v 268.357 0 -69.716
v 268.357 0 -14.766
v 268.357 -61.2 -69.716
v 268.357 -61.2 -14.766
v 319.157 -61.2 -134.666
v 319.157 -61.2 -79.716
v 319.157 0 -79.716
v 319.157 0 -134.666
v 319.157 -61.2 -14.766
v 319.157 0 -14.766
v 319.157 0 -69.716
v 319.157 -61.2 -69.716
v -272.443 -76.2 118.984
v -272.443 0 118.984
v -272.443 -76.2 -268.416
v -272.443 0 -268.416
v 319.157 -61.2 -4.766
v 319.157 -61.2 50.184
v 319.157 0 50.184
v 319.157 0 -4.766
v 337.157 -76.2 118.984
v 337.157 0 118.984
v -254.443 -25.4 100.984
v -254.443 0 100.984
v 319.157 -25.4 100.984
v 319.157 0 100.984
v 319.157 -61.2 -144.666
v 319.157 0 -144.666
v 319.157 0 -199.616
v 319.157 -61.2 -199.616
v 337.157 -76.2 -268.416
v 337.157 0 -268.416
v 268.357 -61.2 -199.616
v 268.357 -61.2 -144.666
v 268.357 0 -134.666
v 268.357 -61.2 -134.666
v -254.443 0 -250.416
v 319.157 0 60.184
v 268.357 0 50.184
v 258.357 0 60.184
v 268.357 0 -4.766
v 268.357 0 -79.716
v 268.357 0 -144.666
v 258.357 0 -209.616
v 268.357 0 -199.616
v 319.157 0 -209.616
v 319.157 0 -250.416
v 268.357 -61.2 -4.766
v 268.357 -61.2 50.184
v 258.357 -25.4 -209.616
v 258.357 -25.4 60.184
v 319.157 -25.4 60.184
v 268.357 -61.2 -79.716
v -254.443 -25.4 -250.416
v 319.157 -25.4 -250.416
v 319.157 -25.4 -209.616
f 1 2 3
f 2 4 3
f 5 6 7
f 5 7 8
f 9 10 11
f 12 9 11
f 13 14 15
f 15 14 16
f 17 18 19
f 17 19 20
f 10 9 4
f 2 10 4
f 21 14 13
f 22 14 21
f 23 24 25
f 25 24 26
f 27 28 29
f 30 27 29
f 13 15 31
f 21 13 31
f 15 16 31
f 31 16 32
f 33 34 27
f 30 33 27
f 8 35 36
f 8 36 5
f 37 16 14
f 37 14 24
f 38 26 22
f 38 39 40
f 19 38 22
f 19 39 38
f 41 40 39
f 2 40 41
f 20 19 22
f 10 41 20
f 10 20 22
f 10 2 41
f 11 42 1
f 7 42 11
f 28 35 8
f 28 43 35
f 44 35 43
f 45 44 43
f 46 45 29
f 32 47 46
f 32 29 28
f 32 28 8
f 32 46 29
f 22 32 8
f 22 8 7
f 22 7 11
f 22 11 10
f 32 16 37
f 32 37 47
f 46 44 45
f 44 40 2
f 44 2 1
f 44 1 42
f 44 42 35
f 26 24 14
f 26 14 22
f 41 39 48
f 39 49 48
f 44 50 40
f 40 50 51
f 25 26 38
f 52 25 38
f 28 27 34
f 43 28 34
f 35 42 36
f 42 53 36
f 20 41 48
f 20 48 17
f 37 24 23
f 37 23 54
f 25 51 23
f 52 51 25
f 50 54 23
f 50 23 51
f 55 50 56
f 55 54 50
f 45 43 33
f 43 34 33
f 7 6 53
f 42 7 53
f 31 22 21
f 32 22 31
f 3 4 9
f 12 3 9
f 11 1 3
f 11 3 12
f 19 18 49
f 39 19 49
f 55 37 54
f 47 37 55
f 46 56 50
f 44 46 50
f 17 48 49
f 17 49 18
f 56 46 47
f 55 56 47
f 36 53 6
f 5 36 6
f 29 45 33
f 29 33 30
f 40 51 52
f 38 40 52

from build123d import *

# Parameters (mm, degrees)
SKETCH1_W           = 609.6
SKETCH1_H           = 387.4
BOSS_EXTRUDE1_DEPTH = 76.2
SKETCH2_W           = 573.6
SKETCH2_H           = 351.4
CUT_EXTRUDE1_DEPTH  = 25.4
SKETCH3_W           = 50.8
SKETCH3_H           = 54.95
CUT_EXTRUDE2_DEPTH  = 35.8
BOSS_EXTRUDE2_DEPTH = 25.4


with BuildPart() as part:
    # Sketch1 → Boss-Extrude1 (new body)
    with BuildSketch(Plane(origin=(0, 0, 0), x_dir=(1, 0, 0), z_dir=(0, 1, 0))):
        with Locations((32.357180973, 74.716472916)):
            Rectangle(SKETCH1_W, SKETCH1_H)
    extrude(amount=-BOSS_EXTRUDE1_DEPTH)

    # Sketch2 → Cut-Extrude1 (cut)
    with BuildSketch(Plane(origin=(0, 0, 0), x_dir=(1, 0, 0), z_dir=(0, 1, 0))):
        with Locations((32.357180973, 74.716472916)):
            Rectangle(SKETCH2_W, SKETCH2_H)
    extrude(amount=-CUT_EXTRUDE1_DEPTH, mode=Mode.SUBTRACT)

    # Sketch3 → Cut-Extrude2 (cut)
    with BuildSketch(Plane(origin=(0, -25.4, 0), x_dir=(1, 0, 0), z_dir=(0, 1, 0))):
        with Locations((293.757180973, 172.141472916)):
            Rectangle(SKETCH3_W, SKETCH3_H)
        with Locations((293.757180973, 107.191472916)):
            Rectangle(SKETCH3_W, SKETCH3_H)
        with Locations((293.757180973, 42.241472916)):
            Rectangle(SKETCH3_W, SKETCH3_H)
        with Locations((293.757180973, -22.708527084)):
            Rectangle(SKETCH3_W, SKETCH3_H)
    extrude(amount=-CUT_EXTRUDE2_DEPTH, mode=Mode.SUBTRACT)

    # Sketch7 → Boss-Extrude2 (add)
    with BuildSketch(Plane(origin=(0, -25.4, 0), x_dir=(1, 0, 0), z_dir=(0, 1, 0))):
        Polygon((319.157180973, 209.616472916), (258.357180973, 209.616472916), (258.357180973, -60.183527084), (319.157180973, -60.183527084), (319.157180973, -50.183527084), (268.357180973, -50.183527084), (268.357180973, 4.766472916), (319.157180973, 4.766472916), (319.157180973, 14.766472916), (268.357180973, 14.766472916), (268.357180973, 69.716472916), (319.157180973, 69.716472916), (319.157180973, 79.716472916), (268.357180973, 79.716472916), (268.357180973, 134.666472916), (319.157180973, 134.666472916), (319.157180973, 144.666472916), (268.357180973, 144.666472916), (268.357180973, 199.616472916), (319.157180973, 199.616472916), align=None)
    extrude(amount=BOSS_EXTRUDE2_DEPTH)


solid = part.part
